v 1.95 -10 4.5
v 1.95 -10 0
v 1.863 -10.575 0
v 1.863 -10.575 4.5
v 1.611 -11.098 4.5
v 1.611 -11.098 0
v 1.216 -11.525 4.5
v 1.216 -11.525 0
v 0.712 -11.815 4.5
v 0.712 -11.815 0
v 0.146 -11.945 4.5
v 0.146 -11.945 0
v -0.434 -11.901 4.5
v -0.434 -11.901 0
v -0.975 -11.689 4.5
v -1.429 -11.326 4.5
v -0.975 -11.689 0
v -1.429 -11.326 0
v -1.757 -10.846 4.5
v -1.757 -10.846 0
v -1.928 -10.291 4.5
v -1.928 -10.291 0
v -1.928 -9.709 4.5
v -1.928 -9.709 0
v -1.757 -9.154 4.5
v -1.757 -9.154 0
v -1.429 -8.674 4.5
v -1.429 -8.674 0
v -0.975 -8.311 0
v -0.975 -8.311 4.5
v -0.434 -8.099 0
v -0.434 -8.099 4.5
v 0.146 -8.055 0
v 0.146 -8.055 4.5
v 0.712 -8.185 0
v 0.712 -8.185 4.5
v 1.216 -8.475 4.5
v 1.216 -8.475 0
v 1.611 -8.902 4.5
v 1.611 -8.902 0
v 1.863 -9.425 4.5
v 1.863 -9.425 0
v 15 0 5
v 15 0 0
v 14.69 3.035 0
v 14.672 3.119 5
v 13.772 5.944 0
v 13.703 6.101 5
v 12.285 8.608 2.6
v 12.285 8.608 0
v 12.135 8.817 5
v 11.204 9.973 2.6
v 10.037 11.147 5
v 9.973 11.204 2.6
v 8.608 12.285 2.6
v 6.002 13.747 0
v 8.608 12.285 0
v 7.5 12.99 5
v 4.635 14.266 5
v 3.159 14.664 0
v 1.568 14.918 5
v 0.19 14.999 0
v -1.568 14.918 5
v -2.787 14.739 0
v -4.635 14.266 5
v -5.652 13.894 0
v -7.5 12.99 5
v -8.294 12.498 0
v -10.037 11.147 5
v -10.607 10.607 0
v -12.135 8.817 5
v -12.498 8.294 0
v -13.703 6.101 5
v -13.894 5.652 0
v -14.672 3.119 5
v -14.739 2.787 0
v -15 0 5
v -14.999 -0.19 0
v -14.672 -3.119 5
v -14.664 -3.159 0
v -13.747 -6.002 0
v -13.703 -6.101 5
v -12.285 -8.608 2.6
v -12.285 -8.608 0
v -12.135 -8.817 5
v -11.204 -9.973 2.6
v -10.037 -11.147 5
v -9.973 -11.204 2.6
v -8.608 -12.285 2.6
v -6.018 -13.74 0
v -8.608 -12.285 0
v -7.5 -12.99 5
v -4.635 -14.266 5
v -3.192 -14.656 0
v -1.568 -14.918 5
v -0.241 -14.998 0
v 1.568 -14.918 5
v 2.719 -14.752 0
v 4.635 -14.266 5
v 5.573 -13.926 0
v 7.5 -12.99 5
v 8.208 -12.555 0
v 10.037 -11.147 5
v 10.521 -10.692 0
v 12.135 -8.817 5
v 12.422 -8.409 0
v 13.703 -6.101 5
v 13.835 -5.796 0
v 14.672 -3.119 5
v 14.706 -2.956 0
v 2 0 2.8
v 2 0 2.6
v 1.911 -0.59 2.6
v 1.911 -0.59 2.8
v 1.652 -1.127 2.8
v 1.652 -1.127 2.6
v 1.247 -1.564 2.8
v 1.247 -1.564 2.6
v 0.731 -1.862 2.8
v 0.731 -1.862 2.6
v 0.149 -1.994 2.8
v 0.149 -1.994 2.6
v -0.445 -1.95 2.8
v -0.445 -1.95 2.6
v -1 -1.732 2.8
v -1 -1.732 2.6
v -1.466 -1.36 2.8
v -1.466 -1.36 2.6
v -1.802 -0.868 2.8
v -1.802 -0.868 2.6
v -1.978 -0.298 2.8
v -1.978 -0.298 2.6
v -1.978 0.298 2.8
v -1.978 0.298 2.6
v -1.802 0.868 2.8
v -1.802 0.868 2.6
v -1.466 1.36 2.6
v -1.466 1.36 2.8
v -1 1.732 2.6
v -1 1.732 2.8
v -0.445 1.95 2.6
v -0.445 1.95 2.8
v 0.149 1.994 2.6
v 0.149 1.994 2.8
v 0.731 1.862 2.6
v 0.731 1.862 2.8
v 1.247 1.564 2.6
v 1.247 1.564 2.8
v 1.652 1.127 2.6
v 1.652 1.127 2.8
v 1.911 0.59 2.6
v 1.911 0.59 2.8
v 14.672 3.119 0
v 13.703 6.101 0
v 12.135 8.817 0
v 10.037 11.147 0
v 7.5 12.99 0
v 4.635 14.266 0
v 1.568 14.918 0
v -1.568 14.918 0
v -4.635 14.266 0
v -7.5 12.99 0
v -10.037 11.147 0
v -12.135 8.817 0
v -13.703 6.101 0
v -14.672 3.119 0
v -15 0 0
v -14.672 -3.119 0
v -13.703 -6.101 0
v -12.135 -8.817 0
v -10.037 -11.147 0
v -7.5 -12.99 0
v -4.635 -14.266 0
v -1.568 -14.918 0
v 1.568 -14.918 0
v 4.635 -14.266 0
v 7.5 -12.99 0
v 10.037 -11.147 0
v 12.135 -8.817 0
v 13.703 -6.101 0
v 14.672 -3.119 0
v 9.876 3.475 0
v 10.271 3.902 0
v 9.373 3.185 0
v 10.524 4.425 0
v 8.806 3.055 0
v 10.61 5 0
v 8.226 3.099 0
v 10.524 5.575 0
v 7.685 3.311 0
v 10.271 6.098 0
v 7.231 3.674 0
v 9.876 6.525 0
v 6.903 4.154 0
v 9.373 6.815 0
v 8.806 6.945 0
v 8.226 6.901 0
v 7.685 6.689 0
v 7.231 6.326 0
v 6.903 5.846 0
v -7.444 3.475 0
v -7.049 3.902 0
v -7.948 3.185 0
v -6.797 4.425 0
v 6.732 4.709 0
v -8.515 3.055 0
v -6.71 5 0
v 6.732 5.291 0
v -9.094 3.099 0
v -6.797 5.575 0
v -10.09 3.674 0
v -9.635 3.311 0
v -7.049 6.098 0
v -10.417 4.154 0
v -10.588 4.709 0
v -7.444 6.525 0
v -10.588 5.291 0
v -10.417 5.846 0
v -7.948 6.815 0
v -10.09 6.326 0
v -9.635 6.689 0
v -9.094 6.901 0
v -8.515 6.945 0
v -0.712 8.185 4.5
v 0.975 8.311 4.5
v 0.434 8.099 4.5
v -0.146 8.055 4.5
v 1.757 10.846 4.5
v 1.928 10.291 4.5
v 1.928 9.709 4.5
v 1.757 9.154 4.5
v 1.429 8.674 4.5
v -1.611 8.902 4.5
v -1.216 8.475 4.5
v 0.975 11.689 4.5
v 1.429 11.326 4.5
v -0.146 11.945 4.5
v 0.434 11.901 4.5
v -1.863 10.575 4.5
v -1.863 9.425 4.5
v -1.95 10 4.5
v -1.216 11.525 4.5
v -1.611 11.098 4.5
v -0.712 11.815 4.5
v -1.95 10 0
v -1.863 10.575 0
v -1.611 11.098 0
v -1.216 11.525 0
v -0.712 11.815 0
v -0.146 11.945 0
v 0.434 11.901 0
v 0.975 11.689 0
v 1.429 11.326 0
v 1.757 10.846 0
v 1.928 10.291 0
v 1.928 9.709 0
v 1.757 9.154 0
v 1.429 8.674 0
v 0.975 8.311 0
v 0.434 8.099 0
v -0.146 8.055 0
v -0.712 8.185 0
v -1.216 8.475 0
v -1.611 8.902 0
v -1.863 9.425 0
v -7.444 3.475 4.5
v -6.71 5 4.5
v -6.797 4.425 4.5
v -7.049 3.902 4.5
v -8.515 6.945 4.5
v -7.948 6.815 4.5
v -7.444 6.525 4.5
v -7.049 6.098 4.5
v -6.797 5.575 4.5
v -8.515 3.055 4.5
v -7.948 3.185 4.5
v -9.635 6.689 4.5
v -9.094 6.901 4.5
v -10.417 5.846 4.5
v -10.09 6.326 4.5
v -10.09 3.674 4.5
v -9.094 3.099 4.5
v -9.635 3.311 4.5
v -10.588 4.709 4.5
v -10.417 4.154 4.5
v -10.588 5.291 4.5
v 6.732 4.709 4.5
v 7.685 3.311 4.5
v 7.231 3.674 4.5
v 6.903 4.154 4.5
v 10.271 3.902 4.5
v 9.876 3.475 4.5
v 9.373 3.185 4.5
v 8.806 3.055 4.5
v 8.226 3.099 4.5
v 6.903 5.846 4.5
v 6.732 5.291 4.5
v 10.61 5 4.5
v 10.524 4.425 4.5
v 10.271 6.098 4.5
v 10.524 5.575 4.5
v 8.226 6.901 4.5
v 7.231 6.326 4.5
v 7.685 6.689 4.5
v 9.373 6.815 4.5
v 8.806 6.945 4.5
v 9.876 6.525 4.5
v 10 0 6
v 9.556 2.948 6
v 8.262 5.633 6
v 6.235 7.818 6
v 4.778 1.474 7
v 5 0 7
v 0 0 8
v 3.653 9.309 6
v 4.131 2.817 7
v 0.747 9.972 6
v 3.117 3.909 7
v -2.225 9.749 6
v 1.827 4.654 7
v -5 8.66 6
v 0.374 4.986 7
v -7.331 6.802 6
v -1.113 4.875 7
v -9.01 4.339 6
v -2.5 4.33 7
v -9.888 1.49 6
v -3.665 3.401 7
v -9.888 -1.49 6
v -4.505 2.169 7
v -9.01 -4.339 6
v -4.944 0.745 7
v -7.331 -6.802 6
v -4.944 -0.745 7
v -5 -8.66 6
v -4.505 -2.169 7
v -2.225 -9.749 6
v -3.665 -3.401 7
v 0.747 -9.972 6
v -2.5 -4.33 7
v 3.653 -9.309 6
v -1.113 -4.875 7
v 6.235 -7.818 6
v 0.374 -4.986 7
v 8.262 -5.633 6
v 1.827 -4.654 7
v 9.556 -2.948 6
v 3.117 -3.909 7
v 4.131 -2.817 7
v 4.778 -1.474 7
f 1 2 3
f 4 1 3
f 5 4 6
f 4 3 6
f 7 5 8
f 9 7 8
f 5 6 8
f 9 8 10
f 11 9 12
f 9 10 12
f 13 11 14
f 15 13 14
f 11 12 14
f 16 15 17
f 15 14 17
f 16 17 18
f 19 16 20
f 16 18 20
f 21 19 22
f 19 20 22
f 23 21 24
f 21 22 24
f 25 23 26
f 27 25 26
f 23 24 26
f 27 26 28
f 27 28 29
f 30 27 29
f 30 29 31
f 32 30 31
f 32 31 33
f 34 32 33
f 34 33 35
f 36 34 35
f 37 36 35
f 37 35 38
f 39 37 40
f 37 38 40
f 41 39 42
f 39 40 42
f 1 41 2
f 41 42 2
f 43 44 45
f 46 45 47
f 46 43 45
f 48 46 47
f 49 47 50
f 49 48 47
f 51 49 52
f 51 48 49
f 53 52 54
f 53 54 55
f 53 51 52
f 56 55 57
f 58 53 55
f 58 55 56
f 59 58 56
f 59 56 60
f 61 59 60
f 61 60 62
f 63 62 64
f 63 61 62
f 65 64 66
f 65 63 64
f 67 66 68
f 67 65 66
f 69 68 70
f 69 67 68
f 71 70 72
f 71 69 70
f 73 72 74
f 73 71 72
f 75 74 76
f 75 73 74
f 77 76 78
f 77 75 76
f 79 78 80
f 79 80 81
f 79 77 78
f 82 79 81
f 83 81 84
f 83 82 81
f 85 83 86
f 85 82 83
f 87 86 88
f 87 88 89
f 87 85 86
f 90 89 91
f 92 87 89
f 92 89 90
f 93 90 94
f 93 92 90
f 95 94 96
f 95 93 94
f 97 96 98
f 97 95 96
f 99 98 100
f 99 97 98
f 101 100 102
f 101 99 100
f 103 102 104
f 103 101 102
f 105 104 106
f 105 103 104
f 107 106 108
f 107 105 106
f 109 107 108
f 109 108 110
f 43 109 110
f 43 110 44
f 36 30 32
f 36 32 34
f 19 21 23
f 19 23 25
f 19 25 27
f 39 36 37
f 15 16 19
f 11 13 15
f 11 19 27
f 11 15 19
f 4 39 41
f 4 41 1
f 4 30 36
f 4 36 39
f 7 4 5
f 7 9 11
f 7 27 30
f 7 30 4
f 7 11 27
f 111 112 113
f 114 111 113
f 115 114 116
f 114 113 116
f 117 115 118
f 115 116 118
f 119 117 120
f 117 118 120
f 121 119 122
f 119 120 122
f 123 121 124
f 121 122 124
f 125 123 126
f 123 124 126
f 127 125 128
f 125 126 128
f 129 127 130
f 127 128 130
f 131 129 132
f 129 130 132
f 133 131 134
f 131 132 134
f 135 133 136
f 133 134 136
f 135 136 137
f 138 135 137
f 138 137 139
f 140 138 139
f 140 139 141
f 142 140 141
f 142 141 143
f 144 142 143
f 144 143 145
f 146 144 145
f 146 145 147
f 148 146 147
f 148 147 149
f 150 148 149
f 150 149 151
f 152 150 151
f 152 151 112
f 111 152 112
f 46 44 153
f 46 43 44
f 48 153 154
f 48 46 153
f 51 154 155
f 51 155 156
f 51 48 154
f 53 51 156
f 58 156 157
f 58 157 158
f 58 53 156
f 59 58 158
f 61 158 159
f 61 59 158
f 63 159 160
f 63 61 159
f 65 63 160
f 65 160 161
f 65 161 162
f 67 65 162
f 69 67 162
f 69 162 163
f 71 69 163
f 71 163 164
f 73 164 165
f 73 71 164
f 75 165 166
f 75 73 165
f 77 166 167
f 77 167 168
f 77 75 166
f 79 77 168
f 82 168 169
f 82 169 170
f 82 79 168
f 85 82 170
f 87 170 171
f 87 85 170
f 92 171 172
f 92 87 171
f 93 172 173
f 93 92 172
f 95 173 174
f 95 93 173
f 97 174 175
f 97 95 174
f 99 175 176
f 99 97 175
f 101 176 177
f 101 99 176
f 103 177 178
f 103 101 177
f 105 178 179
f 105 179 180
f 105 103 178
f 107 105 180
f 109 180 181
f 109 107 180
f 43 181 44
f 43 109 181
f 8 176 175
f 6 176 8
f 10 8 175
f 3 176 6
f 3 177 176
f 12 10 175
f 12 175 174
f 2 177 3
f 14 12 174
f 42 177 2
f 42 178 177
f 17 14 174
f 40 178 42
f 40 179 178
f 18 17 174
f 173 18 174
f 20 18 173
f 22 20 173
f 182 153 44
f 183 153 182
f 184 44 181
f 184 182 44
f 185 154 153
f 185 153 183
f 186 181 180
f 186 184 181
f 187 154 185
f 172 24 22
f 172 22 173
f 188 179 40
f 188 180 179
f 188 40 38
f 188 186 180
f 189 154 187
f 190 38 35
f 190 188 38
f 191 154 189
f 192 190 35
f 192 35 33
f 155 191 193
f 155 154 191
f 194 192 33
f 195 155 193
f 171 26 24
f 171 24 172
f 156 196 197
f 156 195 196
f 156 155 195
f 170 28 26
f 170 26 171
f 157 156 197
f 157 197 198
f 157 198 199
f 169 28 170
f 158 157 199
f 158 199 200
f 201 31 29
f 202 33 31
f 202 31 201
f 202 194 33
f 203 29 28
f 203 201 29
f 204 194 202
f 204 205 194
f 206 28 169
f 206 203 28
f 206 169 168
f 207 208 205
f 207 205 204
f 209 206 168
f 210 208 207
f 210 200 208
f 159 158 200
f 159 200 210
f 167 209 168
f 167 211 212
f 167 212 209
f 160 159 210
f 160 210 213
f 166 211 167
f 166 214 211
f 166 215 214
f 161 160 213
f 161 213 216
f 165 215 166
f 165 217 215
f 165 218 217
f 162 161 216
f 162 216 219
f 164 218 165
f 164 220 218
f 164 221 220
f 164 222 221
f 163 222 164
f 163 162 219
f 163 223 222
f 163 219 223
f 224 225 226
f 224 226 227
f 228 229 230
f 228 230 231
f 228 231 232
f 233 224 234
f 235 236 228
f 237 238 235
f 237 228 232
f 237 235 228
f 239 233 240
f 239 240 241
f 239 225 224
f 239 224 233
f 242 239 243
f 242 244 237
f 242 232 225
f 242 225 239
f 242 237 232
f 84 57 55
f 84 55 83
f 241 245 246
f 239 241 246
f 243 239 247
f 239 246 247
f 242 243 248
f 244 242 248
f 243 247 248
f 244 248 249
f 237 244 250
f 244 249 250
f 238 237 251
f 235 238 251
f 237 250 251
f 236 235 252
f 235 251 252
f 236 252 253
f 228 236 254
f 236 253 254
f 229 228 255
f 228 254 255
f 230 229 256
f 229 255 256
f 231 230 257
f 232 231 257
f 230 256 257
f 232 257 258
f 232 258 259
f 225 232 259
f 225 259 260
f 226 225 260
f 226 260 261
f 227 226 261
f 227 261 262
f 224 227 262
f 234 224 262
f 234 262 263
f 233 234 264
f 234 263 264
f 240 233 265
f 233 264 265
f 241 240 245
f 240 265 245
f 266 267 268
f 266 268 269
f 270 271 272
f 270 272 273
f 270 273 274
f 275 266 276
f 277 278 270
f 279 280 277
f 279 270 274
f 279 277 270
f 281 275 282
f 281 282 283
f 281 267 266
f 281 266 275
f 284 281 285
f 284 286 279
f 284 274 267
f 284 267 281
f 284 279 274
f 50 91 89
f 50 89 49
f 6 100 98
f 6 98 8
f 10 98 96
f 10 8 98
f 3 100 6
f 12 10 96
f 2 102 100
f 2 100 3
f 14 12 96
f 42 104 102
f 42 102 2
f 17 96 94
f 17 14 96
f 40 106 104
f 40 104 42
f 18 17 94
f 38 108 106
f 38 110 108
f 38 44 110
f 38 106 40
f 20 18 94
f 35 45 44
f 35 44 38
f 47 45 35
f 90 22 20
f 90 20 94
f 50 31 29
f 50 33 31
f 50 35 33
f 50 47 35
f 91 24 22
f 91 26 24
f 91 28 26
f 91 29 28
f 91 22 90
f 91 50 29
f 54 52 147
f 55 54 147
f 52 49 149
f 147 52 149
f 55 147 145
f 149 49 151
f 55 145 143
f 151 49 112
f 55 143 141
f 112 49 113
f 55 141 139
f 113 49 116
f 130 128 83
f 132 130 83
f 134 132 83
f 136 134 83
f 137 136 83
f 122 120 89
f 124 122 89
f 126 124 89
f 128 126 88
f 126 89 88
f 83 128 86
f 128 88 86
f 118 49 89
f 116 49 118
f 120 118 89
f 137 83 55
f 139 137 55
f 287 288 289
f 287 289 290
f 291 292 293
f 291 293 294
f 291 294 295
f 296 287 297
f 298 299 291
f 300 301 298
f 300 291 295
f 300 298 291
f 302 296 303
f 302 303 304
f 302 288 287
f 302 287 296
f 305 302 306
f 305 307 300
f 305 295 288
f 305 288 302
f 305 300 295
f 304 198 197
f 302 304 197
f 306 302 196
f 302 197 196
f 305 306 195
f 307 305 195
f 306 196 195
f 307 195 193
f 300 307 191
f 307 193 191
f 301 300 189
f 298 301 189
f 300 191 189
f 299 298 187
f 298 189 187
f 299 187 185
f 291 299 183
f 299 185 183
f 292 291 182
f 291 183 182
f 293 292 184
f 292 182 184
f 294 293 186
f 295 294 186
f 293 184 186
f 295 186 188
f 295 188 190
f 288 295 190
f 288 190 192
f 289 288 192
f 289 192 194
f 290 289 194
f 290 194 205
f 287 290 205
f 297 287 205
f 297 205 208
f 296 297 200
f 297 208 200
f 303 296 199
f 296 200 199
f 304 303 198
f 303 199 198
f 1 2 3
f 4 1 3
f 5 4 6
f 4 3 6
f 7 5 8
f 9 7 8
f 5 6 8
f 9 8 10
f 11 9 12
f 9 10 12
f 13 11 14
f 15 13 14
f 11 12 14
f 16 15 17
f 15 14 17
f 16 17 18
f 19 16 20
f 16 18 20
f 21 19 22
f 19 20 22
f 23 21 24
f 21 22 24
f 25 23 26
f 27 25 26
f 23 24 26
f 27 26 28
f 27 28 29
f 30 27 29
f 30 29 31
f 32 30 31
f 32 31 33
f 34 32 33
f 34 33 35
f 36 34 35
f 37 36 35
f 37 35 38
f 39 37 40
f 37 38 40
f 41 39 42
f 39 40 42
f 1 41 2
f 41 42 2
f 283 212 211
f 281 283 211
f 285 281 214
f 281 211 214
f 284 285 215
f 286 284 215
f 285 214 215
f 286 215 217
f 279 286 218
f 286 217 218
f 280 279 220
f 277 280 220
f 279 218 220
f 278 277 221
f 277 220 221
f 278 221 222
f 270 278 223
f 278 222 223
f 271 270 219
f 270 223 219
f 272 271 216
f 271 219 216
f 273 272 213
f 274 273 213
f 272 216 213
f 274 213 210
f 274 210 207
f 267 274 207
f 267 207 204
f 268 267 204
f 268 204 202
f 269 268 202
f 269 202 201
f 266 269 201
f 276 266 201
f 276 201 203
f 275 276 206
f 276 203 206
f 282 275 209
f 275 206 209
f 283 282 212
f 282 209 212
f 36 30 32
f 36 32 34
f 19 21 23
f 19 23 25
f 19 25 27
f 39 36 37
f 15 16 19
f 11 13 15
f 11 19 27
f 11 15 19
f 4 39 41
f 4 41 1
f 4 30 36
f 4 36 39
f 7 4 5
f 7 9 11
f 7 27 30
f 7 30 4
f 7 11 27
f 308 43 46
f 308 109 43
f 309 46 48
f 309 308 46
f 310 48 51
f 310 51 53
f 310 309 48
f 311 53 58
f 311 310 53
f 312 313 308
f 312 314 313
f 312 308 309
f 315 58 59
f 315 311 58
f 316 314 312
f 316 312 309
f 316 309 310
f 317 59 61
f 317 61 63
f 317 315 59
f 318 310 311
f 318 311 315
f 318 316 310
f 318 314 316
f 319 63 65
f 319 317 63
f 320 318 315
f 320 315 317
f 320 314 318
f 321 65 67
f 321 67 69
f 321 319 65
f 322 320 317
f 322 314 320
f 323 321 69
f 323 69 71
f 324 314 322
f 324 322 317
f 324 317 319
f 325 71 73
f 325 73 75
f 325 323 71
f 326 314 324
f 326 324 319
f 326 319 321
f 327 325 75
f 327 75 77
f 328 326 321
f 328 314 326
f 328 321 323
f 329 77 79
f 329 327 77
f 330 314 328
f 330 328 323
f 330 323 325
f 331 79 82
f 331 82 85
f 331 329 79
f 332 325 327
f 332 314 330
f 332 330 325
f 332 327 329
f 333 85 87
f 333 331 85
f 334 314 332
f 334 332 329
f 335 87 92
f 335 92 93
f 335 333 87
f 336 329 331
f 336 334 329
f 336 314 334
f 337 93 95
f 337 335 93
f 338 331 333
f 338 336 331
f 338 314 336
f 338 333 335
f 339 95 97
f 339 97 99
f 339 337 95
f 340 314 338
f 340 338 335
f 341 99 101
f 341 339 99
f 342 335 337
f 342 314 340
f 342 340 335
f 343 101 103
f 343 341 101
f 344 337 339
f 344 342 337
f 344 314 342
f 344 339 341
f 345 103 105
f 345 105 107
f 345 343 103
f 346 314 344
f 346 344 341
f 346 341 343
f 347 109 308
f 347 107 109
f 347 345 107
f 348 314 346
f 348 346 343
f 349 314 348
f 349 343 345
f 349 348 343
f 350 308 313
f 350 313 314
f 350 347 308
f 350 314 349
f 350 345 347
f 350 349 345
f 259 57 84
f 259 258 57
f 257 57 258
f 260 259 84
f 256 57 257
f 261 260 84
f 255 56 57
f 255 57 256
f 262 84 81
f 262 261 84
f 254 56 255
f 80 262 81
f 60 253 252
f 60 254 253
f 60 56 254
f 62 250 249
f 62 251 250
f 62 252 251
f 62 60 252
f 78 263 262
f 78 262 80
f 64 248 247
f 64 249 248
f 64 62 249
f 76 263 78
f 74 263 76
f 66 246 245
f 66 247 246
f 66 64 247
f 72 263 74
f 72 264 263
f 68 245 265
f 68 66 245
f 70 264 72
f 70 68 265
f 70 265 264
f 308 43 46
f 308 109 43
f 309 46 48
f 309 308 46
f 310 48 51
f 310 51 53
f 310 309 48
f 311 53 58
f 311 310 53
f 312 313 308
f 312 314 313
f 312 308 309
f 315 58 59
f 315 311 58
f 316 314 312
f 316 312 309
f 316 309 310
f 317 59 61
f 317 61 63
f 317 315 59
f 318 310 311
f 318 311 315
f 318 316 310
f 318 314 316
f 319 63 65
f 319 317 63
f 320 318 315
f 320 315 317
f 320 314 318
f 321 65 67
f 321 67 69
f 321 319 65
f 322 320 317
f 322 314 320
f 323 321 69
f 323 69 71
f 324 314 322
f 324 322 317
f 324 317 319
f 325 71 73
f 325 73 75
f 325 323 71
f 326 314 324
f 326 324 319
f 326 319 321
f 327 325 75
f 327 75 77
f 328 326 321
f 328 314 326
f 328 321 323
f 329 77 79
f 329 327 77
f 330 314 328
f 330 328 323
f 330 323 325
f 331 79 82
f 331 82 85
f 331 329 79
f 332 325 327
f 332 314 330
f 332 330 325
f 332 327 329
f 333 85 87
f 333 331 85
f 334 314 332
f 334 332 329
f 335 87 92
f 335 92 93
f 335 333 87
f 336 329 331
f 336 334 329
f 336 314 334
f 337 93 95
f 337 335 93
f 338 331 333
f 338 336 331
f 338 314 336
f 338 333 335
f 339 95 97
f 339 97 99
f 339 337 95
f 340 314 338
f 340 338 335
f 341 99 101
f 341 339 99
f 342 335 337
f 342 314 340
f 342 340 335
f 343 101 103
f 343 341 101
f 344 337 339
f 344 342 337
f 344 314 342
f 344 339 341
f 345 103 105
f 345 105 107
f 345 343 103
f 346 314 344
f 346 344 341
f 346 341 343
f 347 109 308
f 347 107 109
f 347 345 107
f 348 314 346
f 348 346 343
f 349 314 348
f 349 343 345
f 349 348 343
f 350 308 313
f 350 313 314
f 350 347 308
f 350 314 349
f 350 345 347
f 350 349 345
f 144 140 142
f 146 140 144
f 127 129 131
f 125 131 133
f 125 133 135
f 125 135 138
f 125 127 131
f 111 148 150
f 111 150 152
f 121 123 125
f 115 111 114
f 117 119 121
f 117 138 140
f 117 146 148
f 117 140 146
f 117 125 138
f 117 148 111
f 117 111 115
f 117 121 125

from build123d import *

# Parameters (mm, degrees)
SKETCH001_R           = 1.95
POCKET_DEPTH          = 4.5
POLARPATTERN_COUNT    = 3
POLARPATTERN001_COUNT = 2
SKETCH002_R           = 2
POCKET001_DEPTH       = 2.8
POCKET002_DEPTH       = 2.6


with BuildPart() as pocket_body:
    # Sketch → Revolution (revolve)
    with BuildSketch(Plane.XZ):
        Polygon((0, 0), (15, 0), (15, 5), (0, 8), align=None)
    revolve(axis=Axis((0, 0, 0), (0, 0, 1)))

    # Sketch001 → Pocket (cut)
    with BuildSketch(Plane(origin=(0, 0, 0), x_dir=(1, 0, 0), z_dir=(0, 0, -1))):
        with Locations((0, 10)):
            Circle(SKETCH001_R)
    pocket = extrude(amount=-POCKET_DEPTH, mode=Mode.SUBTRACT)


with BuildPart() as polarpattern:
    # PolarPattern base: copy of Pocket body
    add(pocket_body.part)

    # PolarPattern: Pocket ×3 about axis
    polarpattern_axis = Axis((0, 0, 0), (0, 0, -1))
    for i in range(1, POLARPATTERN_COUNT):
        add(pocket.rotate(polarpattern_axis, i * 360 / POLARPATTERN_COUNT), mode=Mode.SUBTRACT)


with BuildPart() as pocket002:
    # PolarPattern001 base: copy of Pocket body
    add(pocket_body.part)

    # PolarPattern001: Pocket ×2 about axis
    polarpattern001_axis = Axis((0, 0, 0), (0, 0, -1))
    for i in range(1, POLARPATTERN001_COUNT):
        add(pocket.rotate(polarpattern001_axis, i * 360 / POLARPATTERN001_COUNT), mode=Mode.SUBTRACT)

    # Sketch002 → Pocket001 (cut)
    with BuildSketch(Plane(origin=(0, 0, 0), x_dir=(1, 0, 0), z_dir=(0, 0, -1))):
        Circle(SKETCH002_R)
    extrude(amount=-POCKET001_DEPTH, mode=Mode.SUBTRACT)

    # Sketch003 → Pocket002 (cut)
    with BuildSketch(Plane(origin=(0, 0, 0), x_dir=(1, 0, 0), z_dir=(0, 0, -1))):
        Polygon((-8.7681240867, 12.4450793489), (12.4450793489, -8.7681240867), (8.7681240867, -12.4450793489), (-12.4450793489, 8.7681240867), align=None)
    extrude(amount=-POCKET002_DEPTH, mode=Mode.SUBTRACT)


solid = Compound([polarpattern.part, pocket002.part])
